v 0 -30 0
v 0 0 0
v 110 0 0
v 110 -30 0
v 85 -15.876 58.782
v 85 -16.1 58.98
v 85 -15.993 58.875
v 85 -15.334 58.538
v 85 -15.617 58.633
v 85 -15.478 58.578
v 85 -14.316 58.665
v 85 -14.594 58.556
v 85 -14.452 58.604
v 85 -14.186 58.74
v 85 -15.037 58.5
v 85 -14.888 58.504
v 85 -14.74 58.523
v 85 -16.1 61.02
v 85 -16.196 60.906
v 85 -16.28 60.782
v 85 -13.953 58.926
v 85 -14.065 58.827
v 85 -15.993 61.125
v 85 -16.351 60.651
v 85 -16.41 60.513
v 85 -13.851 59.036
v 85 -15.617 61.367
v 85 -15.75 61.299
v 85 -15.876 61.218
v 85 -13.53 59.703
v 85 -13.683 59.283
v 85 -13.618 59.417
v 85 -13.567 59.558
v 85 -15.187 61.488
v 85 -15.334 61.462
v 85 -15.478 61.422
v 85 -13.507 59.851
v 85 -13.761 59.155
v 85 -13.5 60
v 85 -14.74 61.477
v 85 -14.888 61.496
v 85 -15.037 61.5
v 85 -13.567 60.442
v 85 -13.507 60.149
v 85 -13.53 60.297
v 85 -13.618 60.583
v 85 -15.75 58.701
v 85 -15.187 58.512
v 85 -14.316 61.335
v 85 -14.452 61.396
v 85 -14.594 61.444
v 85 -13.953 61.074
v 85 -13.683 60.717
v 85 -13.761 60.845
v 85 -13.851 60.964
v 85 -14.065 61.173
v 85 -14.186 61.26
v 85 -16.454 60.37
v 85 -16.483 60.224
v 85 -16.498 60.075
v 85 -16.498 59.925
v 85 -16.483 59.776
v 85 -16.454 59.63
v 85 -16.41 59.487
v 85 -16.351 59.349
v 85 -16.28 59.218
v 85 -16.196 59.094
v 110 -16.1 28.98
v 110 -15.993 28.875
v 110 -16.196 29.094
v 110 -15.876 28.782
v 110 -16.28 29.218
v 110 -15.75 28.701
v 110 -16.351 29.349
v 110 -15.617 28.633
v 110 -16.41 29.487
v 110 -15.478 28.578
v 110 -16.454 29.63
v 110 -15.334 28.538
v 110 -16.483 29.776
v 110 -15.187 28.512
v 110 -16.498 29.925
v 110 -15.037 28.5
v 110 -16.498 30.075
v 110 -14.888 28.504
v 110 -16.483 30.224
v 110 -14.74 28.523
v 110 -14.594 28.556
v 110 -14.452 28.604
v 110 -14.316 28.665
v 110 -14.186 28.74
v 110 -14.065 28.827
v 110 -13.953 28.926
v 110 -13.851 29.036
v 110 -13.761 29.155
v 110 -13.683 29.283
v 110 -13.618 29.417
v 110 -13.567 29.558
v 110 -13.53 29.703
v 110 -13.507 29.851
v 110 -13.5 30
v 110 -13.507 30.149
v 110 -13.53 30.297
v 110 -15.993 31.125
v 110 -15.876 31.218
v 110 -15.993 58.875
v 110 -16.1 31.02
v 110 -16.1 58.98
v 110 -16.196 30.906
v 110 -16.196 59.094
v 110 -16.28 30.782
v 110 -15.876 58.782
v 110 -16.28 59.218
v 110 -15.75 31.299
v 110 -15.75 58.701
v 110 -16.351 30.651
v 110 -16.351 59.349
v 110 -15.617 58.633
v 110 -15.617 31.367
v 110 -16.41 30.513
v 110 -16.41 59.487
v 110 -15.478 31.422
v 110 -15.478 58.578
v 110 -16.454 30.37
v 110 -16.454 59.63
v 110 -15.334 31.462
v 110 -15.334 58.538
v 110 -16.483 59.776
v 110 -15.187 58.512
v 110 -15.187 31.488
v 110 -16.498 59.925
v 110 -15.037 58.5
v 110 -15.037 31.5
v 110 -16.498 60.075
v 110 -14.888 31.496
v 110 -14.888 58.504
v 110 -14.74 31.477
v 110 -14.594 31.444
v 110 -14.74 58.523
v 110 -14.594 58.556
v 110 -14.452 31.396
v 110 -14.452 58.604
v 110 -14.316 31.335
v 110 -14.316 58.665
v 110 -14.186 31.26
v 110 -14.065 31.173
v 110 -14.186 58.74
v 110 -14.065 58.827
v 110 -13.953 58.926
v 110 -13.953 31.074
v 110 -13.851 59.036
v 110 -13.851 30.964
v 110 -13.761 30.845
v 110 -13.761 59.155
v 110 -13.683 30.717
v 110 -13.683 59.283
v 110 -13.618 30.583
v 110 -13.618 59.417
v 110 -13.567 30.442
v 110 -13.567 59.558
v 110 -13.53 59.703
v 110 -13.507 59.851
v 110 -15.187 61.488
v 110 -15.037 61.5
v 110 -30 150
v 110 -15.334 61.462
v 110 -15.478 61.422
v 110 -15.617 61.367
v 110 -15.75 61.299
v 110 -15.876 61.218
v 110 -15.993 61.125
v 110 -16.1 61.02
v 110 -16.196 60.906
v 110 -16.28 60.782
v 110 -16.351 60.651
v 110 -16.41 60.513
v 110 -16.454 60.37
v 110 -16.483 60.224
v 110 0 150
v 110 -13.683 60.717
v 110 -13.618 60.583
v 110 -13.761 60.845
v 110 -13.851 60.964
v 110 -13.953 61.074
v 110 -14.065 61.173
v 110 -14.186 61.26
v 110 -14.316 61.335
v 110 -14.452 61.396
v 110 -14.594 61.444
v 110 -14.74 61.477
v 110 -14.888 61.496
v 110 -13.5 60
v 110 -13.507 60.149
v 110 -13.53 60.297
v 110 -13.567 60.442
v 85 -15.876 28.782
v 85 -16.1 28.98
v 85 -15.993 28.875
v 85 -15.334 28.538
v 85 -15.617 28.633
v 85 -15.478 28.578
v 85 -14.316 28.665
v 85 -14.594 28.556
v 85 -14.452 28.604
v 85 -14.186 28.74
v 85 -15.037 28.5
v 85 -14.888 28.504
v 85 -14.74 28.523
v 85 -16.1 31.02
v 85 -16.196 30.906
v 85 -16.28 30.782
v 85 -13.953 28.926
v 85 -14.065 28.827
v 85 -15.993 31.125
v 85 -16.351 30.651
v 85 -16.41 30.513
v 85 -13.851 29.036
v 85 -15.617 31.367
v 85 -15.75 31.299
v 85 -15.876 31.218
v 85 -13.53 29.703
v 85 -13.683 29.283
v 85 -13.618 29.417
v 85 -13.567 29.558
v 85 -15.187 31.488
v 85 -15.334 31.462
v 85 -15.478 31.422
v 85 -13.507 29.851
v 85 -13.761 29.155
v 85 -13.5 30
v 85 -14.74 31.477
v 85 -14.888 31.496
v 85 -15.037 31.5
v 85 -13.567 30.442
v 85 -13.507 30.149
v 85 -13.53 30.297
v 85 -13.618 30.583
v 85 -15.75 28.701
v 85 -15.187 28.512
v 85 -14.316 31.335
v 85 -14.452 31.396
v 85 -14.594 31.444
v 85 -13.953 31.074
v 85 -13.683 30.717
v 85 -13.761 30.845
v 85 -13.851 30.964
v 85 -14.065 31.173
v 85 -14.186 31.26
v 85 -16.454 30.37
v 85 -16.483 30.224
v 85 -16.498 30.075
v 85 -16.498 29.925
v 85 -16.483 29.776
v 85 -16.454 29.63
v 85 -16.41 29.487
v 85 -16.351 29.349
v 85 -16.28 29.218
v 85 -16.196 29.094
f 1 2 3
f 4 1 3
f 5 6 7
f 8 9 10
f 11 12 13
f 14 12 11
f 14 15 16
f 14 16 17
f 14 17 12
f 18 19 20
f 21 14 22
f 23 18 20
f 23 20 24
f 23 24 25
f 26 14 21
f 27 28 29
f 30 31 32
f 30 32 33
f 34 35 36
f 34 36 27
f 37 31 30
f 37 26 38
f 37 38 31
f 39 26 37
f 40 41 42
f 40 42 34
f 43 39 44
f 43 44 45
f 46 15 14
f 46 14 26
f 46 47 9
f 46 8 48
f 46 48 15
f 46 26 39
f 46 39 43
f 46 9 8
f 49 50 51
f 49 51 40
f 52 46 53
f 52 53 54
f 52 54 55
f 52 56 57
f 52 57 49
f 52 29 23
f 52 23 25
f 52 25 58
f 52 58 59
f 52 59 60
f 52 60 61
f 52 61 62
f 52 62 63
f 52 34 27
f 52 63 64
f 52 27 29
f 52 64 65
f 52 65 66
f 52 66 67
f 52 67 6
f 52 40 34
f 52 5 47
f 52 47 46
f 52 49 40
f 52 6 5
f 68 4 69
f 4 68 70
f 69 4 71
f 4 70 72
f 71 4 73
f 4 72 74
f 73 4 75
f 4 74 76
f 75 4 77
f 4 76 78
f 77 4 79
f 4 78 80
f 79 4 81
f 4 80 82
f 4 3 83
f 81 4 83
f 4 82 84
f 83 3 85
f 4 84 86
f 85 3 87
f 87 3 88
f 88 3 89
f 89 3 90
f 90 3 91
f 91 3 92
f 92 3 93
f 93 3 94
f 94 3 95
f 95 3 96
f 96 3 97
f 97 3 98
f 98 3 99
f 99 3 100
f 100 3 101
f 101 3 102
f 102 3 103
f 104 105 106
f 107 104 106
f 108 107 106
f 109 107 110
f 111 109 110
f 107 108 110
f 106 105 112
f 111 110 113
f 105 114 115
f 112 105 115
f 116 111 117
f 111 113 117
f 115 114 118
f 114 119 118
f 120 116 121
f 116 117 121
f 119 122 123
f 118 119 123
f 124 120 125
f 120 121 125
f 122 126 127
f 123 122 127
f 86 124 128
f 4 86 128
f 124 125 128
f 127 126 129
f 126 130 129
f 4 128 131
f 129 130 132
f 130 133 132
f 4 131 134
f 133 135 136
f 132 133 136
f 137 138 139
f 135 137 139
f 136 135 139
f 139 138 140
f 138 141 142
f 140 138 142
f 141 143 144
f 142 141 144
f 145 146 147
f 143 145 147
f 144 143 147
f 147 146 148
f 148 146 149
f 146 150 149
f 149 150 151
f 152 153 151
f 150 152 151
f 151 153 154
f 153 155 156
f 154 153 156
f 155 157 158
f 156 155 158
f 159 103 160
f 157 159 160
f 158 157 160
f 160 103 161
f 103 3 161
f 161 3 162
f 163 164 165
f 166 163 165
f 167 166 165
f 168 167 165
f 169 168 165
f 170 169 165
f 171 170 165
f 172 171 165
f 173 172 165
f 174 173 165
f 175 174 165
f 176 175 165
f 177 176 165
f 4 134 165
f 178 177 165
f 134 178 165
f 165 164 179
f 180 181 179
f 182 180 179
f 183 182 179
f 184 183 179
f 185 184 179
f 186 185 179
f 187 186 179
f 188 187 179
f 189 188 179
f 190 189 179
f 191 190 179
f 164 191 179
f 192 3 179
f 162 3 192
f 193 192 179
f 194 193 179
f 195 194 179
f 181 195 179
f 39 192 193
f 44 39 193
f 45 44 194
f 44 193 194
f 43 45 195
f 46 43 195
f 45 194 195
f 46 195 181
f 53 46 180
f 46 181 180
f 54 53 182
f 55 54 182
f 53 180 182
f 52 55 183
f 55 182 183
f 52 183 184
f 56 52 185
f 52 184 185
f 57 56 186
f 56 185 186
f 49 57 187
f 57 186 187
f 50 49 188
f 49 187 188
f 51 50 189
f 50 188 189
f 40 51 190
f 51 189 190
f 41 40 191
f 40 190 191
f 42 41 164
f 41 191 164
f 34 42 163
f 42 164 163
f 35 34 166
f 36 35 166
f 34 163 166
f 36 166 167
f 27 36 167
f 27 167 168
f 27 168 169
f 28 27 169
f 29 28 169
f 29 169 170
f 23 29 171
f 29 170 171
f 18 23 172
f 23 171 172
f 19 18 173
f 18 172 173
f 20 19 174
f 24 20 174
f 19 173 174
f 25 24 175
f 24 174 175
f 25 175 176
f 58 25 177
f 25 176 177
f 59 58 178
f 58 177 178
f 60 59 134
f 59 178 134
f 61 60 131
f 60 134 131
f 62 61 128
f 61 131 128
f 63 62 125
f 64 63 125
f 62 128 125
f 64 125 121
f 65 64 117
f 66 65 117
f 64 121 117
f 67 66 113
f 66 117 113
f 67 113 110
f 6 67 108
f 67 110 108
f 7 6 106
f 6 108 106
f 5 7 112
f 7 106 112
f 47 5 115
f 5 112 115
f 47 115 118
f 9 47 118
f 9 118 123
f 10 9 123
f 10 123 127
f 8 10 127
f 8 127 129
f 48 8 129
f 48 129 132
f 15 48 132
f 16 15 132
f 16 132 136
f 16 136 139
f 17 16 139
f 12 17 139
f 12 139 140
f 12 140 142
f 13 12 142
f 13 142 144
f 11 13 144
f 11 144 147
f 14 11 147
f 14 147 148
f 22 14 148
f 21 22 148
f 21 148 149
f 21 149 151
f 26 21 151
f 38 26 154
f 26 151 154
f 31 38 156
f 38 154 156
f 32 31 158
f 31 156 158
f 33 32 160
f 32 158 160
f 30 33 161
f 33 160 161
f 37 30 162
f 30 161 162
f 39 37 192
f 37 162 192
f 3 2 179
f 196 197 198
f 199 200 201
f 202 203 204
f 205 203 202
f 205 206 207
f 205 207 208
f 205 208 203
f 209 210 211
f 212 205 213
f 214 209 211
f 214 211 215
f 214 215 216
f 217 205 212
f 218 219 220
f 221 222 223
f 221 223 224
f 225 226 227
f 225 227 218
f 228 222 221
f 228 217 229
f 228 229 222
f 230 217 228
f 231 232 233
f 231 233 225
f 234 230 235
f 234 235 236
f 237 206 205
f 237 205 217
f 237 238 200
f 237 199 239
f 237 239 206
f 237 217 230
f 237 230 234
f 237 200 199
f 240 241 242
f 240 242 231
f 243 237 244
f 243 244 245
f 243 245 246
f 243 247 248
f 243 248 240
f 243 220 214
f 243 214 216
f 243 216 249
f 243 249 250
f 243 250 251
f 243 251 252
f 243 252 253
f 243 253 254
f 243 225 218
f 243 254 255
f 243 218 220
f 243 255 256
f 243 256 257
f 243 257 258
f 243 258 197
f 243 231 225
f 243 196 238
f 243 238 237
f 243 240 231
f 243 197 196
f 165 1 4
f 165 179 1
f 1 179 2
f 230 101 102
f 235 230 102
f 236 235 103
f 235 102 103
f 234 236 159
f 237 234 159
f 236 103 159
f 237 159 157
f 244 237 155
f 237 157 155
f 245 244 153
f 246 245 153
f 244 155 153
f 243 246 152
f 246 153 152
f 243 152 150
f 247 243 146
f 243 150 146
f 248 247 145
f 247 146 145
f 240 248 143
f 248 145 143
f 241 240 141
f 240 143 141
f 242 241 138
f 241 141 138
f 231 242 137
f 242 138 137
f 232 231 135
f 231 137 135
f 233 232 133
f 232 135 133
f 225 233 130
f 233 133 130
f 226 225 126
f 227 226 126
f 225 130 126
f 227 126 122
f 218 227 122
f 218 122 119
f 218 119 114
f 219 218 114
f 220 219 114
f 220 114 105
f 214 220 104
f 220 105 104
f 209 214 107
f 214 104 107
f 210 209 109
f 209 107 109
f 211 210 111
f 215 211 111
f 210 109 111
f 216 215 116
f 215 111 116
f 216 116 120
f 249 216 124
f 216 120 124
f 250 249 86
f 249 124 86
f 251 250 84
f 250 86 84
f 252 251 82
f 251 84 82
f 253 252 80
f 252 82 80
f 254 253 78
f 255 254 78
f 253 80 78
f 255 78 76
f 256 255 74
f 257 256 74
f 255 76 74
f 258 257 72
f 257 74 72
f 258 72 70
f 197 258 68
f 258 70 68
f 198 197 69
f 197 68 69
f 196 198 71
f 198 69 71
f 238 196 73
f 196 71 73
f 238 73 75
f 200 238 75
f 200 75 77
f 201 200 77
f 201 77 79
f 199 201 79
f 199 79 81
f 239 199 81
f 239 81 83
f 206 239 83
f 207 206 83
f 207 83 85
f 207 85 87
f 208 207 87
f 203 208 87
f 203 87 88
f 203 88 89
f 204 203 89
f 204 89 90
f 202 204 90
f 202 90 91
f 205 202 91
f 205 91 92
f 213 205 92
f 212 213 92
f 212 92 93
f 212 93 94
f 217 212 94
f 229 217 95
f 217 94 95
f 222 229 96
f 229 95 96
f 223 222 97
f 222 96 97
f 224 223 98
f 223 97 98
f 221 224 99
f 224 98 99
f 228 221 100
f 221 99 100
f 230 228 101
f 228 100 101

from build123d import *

# Parameters (mm, degrees)
F1_DEPTH = 30
F2_R     = 1.5
F3_DEPTH = 25


# Not quite as in the source:
# - a feature names something its author has since deleted; it is built from what else it names


with BuildPart() as f1:
    # F0 (on Front) → F1 (new body)
    with BuildSketch(Plane.XZ):
        Polygon((110, 150), (0, 0), (110, 0), align=None)
    extrude(amount=F1_DEPTH)

    # F2 (on face) → F3 (cut)
    with BuildSketch(Plane.YZ.offset(110)):
        with Locations((-15, 30)):
            Circle(F2_R)
        with Locations((-15, 60)):
            Circle(F2_R)
    extrude(amount=-F3_DEPTH, mode=Mode.SUBTRACT)


solid = f1.part
